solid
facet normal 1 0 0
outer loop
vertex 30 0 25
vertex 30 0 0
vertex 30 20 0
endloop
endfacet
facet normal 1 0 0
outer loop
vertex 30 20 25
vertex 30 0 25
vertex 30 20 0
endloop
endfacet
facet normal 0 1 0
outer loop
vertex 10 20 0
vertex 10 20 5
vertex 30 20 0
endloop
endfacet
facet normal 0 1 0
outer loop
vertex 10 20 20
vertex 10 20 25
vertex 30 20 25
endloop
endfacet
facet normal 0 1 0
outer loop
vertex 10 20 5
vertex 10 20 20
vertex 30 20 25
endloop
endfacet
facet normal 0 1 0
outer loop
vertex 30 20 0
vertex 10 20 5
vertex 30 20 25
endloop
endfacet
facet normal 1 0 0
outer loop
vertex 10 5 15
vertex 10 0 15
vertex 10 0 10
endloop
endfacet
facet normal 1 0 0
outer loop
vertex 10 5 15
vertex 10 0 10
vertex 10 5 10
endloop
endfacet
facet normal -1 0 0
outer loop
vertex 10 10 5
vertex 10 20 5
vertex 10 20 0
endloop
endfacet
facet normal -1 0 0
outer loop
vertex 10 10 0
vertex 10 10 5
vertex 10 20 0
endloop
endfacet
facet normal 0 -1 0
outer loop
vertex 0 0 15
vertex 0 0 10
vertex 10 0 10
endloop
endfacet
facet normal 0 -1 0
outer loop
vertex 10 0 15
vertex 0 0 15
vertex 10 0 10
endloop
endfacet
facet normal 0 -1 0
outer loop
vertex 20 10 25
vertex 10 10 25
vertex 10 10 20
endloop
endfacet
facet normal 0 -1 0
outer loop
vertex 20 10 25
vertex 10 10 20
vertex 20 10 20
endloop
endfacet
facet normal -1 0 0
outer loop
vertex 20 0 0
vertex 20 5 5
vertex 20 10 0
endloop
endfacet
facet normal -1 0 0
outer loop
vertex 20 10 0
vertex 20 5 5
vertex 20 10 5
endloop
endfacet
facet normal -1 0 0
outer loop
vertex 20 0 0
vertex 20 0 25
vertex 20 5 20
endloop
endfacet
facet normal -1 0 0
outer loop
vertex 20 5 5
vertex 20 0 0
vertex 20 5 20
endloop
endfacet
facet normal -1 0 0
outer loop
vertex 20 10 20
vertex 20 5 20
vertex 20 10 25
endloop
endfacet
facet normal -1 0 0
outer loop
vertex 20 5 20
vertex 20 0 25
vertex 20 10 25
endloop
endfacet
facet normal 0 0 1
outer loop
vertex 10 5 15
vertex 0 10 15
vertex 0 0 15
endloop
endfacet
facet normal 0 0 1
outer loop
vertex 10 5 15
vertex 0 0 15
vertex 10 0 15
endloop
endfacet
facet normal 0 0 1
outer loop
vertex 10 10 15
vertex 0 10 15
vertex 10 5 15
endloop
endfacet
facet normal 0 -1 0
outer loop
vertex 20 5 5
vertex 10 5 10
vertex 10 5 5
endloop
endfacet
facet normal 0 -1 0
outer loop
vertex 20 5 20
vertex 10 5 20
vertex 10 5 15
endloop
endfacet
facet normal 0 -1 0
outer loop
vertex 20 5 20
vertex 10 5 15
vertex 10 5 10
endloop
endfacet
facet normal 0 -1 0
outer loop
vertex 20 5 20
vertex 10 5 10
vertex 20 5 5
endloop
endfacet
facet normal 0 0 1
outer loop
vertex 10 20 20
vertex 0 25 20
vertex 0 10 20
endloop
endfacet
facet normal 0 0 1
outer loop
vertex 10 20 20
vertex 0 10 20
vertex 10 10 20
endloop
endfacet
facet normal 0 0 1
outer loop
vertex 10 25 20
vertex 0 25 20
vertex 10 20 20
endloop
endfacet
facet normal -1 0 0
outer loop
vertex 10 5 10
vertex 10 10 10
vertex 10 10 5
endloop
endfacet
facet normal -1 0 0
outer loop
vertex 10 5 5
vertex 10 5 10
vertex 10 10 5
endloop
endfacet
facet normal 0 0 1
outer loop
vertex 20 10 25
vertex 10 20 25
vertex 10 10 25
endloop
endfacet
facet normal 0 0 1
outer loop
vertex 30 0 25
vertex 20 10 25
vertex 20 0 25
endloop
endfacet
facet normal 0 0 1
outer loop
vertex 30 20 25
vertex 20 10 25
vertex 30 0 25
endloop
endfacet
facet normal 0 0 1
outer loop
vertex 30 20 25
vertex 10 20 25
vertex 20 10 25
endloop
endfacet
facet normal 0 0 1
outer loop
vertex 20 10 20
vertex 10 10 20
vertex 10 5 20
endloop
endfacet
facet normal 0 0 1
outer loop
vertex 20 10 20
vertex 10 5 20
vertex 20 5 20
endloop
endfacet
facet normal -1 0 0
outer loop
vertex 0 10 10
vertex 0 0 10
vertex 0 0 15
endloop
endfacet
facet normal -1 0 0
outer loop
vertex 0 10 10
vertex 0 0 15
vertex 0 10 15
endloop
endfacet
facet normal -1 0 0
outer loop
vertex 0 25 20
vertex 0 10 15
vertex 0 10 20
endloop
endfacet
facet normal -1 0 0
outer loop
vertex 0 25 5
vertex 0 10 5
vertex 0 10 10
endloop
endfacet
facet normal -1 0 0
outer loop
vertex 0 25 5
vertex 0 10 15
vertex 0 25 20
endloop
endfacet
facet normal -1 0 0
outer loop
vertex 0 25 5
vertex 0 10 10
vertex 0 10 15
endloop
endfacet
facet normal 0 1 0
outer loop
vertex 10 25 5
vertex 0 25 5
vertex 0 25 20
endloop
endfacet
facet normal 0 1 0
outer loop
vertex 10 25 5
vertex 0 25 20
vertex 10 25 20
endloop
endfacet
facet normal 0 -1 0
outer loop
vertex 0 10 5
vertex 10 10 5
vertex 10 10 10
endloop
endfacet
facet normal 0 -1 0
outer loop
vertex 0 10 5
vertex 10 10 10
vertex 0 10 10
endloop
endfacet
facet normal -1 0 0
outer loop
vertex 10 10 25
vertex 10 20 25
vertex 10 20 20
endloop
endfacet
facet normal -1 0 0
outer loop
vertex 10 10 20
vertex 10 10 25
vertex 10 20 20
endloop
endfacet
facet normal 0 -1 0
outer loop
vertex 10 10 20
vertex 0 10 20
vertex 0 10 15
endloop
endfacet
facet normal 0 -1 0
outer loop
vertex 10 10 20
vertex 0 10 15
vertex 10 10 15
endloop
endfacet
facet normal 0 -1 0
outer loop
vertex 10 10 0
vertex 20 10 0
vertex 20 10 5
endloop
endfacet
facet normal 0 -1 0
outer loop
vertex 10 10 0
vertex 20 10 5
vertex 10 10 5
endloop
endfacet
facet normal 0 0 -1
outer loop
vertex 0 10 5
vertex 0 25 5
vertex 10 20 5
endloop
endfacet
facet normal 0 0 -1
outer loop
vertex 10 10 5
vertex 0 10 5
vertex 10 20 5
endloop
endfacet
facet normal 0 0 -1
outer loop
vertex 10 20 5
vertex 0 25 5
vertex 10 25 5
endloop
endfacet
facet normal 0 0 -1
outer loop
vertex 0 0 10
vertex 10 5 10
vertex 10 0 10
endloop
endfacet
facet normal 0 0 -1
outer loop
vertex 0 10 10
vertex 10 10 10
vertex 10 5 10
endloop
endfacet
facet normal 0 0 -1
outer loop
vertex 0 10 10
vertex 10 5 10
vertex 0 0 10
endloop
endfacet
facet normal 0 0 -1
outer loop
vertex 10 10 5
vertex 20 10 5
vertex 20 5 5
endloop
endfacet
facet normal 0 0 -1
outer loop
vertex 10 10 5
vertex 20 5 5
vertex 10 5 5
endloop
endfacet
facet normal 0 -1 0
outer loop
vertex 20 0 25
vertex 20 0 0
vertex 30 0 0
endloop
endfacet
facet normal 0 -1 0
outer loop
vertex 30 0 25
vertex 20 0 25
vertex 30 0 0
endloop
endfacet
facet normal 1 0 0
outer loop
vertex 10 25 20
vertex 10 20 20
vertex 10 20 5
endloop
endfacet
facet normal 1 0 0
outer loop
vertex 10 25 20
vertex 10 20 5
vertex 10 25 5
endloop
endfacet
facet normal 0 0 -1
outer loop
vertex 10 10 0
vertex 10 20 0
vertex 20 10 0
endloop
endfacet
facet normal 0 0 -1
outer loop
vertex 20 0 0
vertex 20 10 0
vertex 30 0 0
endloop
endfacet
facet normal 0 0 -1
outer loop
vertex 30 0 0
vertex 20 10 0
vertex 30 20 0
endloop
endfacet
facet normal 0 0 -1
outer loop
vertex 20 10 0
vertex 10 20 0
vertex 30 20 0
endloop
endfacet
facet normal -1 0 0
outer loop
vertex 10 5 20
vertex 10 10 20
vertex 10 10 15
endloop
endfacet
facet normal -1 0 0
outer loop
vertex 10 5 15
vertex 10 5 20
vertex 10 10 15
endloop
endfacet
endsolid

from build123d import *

# Parameters (mm, degrees)
SKETCH1_W           = 30
SKETCH1_H           = 25
BOSS_EXTRUDE1_DEPTH = 25
SKETCH2_W           = 10
SKETCH2_H           = 10
CUT_EXTRUDE3_DEPTH  = 10
SKETCH4_W           = 10
SKETCH4_H           = 5
CUT_EXTRUDE4_DEPTH  = 25
SKETCH5_W           = 10
SKETCH5_H           = 10
CUT_EXTRUDE5_DEPTH  = 10
SKETCH6_W           = 20
SKETCH6_H           = 5
CUT_EXTRUDE6_DEPTH  = 25
SKETCH7_W           = 10
SKETCH7_H           = 5
CUT_EXTRUDE7_DEPTH  = 25
SKETCH8_W           = 10
SKETCH8_H           = 5
CUT_EXTRUDE8_DEPTH  = 5
SKETCH9_W           = 10
SKETCH9_H           = 5
CUT_EXTRUDE9_DEPTH  = 5


with BuildPart() as part:
    # Sketch1 → Boss-Extrude1 (new body)
    with BuildSketch(Plane.XY):
        with Locations((15, 12.5)):
            Rectangle(SKETCH1_W, SKETCH1_H)
    extrude(amount=BOSS_EXTRUDE1_DEPTH)

    # Sketch2 → Cut-Extrude3 (cut)
    with BuildSketch(Plane.XY.offset(25)):
        with Locations((5, 5)):
            Rectangle(SKETCH2_W, SKETCH2_H)
    extrude(amount=-CUT_EXTRUDE3_DEPTH, mode=Mode.SUBTRACT)

    # Sketch4 → Cut-Extrude4 (cut)
    with BuildSketch(Plane.XY.offset(25)):
        with Locations((15, 2.5)):
            Rectangle(SKETCH4_W, SKETCH4_H)
    extrude(amount=-CUT_EXTRUDE4_DEPTH, mode=Mode.SUBTRACT)

    # Sketch5 → Cut-Extrude5 (cut)
    with BuildSketch(Plane(origin=(0, 0, 0), x_dir=(-1, 0, 0), z_dir=(0, 0, -1))):
        with Locations((-5, 5)):
            Rectangle(SKETCH5_W, SKETCH5_H)
    extrude(amount=-CUT_EXTRUDE5_DEPTH, mode=Mode.SUBTRACT)

    # Sketch6 → Cut-Extrude6 (cut)
    with BuildSketch(Plane.XY.offset(25)):
        with Locations((20, 22.5)):
            Rectangle(SKETCH6_W, SKETCH6_H)
    extrude(amount=-CUT_EXTRUDE6_DEPTH, mode=Mode.SUBTRACT)

    # Sketch7 → Cut-Extrude7 (cut)
    with BuildSketch(Plane(origin=(0, 25, 0), x_dir=(1, 0, 0), z_dir=(0, 1, 0))):
        with Locations((5, -2.5)):
            Rectangle(SKETCH7_W, SKETCH7_H)
        with Locations((5, -22.5)):
            Rectangle(SKETCH7_W, SKETCH7_H)
    extrude(amount=-CUT_EXTRUDE7_DEPTH, mode=Mode.SUBTRACT)

    # Sketch8 → Cut-Extrude8 (cut)
    with BuildSketch(Plane.XY.offset(25)):
        with Locations((15, 7.5)):
            Rectangle(SKETCH8_W, SKETCH8_H)
    extrude(amount=-CUT_EXTRUDE8_DEPTH, mode=Mode.SUBTRACT)

    # Sketch9 → Cut-Extrude9 (cut)
    with BuildSketch(Plane(origin=(0, 0, 0), x_dir=(-1, 0, 0), z_dir=(0, 0, -1))):
        with Locations((-15, 7.5)):
            Rectangle(SKETCH9_W, SKETCH9_H)
    extrude(amount=-CUT_EXTRUDE9_DEPTH, mode=Mode.SUBTRACT)


solid = part.part
